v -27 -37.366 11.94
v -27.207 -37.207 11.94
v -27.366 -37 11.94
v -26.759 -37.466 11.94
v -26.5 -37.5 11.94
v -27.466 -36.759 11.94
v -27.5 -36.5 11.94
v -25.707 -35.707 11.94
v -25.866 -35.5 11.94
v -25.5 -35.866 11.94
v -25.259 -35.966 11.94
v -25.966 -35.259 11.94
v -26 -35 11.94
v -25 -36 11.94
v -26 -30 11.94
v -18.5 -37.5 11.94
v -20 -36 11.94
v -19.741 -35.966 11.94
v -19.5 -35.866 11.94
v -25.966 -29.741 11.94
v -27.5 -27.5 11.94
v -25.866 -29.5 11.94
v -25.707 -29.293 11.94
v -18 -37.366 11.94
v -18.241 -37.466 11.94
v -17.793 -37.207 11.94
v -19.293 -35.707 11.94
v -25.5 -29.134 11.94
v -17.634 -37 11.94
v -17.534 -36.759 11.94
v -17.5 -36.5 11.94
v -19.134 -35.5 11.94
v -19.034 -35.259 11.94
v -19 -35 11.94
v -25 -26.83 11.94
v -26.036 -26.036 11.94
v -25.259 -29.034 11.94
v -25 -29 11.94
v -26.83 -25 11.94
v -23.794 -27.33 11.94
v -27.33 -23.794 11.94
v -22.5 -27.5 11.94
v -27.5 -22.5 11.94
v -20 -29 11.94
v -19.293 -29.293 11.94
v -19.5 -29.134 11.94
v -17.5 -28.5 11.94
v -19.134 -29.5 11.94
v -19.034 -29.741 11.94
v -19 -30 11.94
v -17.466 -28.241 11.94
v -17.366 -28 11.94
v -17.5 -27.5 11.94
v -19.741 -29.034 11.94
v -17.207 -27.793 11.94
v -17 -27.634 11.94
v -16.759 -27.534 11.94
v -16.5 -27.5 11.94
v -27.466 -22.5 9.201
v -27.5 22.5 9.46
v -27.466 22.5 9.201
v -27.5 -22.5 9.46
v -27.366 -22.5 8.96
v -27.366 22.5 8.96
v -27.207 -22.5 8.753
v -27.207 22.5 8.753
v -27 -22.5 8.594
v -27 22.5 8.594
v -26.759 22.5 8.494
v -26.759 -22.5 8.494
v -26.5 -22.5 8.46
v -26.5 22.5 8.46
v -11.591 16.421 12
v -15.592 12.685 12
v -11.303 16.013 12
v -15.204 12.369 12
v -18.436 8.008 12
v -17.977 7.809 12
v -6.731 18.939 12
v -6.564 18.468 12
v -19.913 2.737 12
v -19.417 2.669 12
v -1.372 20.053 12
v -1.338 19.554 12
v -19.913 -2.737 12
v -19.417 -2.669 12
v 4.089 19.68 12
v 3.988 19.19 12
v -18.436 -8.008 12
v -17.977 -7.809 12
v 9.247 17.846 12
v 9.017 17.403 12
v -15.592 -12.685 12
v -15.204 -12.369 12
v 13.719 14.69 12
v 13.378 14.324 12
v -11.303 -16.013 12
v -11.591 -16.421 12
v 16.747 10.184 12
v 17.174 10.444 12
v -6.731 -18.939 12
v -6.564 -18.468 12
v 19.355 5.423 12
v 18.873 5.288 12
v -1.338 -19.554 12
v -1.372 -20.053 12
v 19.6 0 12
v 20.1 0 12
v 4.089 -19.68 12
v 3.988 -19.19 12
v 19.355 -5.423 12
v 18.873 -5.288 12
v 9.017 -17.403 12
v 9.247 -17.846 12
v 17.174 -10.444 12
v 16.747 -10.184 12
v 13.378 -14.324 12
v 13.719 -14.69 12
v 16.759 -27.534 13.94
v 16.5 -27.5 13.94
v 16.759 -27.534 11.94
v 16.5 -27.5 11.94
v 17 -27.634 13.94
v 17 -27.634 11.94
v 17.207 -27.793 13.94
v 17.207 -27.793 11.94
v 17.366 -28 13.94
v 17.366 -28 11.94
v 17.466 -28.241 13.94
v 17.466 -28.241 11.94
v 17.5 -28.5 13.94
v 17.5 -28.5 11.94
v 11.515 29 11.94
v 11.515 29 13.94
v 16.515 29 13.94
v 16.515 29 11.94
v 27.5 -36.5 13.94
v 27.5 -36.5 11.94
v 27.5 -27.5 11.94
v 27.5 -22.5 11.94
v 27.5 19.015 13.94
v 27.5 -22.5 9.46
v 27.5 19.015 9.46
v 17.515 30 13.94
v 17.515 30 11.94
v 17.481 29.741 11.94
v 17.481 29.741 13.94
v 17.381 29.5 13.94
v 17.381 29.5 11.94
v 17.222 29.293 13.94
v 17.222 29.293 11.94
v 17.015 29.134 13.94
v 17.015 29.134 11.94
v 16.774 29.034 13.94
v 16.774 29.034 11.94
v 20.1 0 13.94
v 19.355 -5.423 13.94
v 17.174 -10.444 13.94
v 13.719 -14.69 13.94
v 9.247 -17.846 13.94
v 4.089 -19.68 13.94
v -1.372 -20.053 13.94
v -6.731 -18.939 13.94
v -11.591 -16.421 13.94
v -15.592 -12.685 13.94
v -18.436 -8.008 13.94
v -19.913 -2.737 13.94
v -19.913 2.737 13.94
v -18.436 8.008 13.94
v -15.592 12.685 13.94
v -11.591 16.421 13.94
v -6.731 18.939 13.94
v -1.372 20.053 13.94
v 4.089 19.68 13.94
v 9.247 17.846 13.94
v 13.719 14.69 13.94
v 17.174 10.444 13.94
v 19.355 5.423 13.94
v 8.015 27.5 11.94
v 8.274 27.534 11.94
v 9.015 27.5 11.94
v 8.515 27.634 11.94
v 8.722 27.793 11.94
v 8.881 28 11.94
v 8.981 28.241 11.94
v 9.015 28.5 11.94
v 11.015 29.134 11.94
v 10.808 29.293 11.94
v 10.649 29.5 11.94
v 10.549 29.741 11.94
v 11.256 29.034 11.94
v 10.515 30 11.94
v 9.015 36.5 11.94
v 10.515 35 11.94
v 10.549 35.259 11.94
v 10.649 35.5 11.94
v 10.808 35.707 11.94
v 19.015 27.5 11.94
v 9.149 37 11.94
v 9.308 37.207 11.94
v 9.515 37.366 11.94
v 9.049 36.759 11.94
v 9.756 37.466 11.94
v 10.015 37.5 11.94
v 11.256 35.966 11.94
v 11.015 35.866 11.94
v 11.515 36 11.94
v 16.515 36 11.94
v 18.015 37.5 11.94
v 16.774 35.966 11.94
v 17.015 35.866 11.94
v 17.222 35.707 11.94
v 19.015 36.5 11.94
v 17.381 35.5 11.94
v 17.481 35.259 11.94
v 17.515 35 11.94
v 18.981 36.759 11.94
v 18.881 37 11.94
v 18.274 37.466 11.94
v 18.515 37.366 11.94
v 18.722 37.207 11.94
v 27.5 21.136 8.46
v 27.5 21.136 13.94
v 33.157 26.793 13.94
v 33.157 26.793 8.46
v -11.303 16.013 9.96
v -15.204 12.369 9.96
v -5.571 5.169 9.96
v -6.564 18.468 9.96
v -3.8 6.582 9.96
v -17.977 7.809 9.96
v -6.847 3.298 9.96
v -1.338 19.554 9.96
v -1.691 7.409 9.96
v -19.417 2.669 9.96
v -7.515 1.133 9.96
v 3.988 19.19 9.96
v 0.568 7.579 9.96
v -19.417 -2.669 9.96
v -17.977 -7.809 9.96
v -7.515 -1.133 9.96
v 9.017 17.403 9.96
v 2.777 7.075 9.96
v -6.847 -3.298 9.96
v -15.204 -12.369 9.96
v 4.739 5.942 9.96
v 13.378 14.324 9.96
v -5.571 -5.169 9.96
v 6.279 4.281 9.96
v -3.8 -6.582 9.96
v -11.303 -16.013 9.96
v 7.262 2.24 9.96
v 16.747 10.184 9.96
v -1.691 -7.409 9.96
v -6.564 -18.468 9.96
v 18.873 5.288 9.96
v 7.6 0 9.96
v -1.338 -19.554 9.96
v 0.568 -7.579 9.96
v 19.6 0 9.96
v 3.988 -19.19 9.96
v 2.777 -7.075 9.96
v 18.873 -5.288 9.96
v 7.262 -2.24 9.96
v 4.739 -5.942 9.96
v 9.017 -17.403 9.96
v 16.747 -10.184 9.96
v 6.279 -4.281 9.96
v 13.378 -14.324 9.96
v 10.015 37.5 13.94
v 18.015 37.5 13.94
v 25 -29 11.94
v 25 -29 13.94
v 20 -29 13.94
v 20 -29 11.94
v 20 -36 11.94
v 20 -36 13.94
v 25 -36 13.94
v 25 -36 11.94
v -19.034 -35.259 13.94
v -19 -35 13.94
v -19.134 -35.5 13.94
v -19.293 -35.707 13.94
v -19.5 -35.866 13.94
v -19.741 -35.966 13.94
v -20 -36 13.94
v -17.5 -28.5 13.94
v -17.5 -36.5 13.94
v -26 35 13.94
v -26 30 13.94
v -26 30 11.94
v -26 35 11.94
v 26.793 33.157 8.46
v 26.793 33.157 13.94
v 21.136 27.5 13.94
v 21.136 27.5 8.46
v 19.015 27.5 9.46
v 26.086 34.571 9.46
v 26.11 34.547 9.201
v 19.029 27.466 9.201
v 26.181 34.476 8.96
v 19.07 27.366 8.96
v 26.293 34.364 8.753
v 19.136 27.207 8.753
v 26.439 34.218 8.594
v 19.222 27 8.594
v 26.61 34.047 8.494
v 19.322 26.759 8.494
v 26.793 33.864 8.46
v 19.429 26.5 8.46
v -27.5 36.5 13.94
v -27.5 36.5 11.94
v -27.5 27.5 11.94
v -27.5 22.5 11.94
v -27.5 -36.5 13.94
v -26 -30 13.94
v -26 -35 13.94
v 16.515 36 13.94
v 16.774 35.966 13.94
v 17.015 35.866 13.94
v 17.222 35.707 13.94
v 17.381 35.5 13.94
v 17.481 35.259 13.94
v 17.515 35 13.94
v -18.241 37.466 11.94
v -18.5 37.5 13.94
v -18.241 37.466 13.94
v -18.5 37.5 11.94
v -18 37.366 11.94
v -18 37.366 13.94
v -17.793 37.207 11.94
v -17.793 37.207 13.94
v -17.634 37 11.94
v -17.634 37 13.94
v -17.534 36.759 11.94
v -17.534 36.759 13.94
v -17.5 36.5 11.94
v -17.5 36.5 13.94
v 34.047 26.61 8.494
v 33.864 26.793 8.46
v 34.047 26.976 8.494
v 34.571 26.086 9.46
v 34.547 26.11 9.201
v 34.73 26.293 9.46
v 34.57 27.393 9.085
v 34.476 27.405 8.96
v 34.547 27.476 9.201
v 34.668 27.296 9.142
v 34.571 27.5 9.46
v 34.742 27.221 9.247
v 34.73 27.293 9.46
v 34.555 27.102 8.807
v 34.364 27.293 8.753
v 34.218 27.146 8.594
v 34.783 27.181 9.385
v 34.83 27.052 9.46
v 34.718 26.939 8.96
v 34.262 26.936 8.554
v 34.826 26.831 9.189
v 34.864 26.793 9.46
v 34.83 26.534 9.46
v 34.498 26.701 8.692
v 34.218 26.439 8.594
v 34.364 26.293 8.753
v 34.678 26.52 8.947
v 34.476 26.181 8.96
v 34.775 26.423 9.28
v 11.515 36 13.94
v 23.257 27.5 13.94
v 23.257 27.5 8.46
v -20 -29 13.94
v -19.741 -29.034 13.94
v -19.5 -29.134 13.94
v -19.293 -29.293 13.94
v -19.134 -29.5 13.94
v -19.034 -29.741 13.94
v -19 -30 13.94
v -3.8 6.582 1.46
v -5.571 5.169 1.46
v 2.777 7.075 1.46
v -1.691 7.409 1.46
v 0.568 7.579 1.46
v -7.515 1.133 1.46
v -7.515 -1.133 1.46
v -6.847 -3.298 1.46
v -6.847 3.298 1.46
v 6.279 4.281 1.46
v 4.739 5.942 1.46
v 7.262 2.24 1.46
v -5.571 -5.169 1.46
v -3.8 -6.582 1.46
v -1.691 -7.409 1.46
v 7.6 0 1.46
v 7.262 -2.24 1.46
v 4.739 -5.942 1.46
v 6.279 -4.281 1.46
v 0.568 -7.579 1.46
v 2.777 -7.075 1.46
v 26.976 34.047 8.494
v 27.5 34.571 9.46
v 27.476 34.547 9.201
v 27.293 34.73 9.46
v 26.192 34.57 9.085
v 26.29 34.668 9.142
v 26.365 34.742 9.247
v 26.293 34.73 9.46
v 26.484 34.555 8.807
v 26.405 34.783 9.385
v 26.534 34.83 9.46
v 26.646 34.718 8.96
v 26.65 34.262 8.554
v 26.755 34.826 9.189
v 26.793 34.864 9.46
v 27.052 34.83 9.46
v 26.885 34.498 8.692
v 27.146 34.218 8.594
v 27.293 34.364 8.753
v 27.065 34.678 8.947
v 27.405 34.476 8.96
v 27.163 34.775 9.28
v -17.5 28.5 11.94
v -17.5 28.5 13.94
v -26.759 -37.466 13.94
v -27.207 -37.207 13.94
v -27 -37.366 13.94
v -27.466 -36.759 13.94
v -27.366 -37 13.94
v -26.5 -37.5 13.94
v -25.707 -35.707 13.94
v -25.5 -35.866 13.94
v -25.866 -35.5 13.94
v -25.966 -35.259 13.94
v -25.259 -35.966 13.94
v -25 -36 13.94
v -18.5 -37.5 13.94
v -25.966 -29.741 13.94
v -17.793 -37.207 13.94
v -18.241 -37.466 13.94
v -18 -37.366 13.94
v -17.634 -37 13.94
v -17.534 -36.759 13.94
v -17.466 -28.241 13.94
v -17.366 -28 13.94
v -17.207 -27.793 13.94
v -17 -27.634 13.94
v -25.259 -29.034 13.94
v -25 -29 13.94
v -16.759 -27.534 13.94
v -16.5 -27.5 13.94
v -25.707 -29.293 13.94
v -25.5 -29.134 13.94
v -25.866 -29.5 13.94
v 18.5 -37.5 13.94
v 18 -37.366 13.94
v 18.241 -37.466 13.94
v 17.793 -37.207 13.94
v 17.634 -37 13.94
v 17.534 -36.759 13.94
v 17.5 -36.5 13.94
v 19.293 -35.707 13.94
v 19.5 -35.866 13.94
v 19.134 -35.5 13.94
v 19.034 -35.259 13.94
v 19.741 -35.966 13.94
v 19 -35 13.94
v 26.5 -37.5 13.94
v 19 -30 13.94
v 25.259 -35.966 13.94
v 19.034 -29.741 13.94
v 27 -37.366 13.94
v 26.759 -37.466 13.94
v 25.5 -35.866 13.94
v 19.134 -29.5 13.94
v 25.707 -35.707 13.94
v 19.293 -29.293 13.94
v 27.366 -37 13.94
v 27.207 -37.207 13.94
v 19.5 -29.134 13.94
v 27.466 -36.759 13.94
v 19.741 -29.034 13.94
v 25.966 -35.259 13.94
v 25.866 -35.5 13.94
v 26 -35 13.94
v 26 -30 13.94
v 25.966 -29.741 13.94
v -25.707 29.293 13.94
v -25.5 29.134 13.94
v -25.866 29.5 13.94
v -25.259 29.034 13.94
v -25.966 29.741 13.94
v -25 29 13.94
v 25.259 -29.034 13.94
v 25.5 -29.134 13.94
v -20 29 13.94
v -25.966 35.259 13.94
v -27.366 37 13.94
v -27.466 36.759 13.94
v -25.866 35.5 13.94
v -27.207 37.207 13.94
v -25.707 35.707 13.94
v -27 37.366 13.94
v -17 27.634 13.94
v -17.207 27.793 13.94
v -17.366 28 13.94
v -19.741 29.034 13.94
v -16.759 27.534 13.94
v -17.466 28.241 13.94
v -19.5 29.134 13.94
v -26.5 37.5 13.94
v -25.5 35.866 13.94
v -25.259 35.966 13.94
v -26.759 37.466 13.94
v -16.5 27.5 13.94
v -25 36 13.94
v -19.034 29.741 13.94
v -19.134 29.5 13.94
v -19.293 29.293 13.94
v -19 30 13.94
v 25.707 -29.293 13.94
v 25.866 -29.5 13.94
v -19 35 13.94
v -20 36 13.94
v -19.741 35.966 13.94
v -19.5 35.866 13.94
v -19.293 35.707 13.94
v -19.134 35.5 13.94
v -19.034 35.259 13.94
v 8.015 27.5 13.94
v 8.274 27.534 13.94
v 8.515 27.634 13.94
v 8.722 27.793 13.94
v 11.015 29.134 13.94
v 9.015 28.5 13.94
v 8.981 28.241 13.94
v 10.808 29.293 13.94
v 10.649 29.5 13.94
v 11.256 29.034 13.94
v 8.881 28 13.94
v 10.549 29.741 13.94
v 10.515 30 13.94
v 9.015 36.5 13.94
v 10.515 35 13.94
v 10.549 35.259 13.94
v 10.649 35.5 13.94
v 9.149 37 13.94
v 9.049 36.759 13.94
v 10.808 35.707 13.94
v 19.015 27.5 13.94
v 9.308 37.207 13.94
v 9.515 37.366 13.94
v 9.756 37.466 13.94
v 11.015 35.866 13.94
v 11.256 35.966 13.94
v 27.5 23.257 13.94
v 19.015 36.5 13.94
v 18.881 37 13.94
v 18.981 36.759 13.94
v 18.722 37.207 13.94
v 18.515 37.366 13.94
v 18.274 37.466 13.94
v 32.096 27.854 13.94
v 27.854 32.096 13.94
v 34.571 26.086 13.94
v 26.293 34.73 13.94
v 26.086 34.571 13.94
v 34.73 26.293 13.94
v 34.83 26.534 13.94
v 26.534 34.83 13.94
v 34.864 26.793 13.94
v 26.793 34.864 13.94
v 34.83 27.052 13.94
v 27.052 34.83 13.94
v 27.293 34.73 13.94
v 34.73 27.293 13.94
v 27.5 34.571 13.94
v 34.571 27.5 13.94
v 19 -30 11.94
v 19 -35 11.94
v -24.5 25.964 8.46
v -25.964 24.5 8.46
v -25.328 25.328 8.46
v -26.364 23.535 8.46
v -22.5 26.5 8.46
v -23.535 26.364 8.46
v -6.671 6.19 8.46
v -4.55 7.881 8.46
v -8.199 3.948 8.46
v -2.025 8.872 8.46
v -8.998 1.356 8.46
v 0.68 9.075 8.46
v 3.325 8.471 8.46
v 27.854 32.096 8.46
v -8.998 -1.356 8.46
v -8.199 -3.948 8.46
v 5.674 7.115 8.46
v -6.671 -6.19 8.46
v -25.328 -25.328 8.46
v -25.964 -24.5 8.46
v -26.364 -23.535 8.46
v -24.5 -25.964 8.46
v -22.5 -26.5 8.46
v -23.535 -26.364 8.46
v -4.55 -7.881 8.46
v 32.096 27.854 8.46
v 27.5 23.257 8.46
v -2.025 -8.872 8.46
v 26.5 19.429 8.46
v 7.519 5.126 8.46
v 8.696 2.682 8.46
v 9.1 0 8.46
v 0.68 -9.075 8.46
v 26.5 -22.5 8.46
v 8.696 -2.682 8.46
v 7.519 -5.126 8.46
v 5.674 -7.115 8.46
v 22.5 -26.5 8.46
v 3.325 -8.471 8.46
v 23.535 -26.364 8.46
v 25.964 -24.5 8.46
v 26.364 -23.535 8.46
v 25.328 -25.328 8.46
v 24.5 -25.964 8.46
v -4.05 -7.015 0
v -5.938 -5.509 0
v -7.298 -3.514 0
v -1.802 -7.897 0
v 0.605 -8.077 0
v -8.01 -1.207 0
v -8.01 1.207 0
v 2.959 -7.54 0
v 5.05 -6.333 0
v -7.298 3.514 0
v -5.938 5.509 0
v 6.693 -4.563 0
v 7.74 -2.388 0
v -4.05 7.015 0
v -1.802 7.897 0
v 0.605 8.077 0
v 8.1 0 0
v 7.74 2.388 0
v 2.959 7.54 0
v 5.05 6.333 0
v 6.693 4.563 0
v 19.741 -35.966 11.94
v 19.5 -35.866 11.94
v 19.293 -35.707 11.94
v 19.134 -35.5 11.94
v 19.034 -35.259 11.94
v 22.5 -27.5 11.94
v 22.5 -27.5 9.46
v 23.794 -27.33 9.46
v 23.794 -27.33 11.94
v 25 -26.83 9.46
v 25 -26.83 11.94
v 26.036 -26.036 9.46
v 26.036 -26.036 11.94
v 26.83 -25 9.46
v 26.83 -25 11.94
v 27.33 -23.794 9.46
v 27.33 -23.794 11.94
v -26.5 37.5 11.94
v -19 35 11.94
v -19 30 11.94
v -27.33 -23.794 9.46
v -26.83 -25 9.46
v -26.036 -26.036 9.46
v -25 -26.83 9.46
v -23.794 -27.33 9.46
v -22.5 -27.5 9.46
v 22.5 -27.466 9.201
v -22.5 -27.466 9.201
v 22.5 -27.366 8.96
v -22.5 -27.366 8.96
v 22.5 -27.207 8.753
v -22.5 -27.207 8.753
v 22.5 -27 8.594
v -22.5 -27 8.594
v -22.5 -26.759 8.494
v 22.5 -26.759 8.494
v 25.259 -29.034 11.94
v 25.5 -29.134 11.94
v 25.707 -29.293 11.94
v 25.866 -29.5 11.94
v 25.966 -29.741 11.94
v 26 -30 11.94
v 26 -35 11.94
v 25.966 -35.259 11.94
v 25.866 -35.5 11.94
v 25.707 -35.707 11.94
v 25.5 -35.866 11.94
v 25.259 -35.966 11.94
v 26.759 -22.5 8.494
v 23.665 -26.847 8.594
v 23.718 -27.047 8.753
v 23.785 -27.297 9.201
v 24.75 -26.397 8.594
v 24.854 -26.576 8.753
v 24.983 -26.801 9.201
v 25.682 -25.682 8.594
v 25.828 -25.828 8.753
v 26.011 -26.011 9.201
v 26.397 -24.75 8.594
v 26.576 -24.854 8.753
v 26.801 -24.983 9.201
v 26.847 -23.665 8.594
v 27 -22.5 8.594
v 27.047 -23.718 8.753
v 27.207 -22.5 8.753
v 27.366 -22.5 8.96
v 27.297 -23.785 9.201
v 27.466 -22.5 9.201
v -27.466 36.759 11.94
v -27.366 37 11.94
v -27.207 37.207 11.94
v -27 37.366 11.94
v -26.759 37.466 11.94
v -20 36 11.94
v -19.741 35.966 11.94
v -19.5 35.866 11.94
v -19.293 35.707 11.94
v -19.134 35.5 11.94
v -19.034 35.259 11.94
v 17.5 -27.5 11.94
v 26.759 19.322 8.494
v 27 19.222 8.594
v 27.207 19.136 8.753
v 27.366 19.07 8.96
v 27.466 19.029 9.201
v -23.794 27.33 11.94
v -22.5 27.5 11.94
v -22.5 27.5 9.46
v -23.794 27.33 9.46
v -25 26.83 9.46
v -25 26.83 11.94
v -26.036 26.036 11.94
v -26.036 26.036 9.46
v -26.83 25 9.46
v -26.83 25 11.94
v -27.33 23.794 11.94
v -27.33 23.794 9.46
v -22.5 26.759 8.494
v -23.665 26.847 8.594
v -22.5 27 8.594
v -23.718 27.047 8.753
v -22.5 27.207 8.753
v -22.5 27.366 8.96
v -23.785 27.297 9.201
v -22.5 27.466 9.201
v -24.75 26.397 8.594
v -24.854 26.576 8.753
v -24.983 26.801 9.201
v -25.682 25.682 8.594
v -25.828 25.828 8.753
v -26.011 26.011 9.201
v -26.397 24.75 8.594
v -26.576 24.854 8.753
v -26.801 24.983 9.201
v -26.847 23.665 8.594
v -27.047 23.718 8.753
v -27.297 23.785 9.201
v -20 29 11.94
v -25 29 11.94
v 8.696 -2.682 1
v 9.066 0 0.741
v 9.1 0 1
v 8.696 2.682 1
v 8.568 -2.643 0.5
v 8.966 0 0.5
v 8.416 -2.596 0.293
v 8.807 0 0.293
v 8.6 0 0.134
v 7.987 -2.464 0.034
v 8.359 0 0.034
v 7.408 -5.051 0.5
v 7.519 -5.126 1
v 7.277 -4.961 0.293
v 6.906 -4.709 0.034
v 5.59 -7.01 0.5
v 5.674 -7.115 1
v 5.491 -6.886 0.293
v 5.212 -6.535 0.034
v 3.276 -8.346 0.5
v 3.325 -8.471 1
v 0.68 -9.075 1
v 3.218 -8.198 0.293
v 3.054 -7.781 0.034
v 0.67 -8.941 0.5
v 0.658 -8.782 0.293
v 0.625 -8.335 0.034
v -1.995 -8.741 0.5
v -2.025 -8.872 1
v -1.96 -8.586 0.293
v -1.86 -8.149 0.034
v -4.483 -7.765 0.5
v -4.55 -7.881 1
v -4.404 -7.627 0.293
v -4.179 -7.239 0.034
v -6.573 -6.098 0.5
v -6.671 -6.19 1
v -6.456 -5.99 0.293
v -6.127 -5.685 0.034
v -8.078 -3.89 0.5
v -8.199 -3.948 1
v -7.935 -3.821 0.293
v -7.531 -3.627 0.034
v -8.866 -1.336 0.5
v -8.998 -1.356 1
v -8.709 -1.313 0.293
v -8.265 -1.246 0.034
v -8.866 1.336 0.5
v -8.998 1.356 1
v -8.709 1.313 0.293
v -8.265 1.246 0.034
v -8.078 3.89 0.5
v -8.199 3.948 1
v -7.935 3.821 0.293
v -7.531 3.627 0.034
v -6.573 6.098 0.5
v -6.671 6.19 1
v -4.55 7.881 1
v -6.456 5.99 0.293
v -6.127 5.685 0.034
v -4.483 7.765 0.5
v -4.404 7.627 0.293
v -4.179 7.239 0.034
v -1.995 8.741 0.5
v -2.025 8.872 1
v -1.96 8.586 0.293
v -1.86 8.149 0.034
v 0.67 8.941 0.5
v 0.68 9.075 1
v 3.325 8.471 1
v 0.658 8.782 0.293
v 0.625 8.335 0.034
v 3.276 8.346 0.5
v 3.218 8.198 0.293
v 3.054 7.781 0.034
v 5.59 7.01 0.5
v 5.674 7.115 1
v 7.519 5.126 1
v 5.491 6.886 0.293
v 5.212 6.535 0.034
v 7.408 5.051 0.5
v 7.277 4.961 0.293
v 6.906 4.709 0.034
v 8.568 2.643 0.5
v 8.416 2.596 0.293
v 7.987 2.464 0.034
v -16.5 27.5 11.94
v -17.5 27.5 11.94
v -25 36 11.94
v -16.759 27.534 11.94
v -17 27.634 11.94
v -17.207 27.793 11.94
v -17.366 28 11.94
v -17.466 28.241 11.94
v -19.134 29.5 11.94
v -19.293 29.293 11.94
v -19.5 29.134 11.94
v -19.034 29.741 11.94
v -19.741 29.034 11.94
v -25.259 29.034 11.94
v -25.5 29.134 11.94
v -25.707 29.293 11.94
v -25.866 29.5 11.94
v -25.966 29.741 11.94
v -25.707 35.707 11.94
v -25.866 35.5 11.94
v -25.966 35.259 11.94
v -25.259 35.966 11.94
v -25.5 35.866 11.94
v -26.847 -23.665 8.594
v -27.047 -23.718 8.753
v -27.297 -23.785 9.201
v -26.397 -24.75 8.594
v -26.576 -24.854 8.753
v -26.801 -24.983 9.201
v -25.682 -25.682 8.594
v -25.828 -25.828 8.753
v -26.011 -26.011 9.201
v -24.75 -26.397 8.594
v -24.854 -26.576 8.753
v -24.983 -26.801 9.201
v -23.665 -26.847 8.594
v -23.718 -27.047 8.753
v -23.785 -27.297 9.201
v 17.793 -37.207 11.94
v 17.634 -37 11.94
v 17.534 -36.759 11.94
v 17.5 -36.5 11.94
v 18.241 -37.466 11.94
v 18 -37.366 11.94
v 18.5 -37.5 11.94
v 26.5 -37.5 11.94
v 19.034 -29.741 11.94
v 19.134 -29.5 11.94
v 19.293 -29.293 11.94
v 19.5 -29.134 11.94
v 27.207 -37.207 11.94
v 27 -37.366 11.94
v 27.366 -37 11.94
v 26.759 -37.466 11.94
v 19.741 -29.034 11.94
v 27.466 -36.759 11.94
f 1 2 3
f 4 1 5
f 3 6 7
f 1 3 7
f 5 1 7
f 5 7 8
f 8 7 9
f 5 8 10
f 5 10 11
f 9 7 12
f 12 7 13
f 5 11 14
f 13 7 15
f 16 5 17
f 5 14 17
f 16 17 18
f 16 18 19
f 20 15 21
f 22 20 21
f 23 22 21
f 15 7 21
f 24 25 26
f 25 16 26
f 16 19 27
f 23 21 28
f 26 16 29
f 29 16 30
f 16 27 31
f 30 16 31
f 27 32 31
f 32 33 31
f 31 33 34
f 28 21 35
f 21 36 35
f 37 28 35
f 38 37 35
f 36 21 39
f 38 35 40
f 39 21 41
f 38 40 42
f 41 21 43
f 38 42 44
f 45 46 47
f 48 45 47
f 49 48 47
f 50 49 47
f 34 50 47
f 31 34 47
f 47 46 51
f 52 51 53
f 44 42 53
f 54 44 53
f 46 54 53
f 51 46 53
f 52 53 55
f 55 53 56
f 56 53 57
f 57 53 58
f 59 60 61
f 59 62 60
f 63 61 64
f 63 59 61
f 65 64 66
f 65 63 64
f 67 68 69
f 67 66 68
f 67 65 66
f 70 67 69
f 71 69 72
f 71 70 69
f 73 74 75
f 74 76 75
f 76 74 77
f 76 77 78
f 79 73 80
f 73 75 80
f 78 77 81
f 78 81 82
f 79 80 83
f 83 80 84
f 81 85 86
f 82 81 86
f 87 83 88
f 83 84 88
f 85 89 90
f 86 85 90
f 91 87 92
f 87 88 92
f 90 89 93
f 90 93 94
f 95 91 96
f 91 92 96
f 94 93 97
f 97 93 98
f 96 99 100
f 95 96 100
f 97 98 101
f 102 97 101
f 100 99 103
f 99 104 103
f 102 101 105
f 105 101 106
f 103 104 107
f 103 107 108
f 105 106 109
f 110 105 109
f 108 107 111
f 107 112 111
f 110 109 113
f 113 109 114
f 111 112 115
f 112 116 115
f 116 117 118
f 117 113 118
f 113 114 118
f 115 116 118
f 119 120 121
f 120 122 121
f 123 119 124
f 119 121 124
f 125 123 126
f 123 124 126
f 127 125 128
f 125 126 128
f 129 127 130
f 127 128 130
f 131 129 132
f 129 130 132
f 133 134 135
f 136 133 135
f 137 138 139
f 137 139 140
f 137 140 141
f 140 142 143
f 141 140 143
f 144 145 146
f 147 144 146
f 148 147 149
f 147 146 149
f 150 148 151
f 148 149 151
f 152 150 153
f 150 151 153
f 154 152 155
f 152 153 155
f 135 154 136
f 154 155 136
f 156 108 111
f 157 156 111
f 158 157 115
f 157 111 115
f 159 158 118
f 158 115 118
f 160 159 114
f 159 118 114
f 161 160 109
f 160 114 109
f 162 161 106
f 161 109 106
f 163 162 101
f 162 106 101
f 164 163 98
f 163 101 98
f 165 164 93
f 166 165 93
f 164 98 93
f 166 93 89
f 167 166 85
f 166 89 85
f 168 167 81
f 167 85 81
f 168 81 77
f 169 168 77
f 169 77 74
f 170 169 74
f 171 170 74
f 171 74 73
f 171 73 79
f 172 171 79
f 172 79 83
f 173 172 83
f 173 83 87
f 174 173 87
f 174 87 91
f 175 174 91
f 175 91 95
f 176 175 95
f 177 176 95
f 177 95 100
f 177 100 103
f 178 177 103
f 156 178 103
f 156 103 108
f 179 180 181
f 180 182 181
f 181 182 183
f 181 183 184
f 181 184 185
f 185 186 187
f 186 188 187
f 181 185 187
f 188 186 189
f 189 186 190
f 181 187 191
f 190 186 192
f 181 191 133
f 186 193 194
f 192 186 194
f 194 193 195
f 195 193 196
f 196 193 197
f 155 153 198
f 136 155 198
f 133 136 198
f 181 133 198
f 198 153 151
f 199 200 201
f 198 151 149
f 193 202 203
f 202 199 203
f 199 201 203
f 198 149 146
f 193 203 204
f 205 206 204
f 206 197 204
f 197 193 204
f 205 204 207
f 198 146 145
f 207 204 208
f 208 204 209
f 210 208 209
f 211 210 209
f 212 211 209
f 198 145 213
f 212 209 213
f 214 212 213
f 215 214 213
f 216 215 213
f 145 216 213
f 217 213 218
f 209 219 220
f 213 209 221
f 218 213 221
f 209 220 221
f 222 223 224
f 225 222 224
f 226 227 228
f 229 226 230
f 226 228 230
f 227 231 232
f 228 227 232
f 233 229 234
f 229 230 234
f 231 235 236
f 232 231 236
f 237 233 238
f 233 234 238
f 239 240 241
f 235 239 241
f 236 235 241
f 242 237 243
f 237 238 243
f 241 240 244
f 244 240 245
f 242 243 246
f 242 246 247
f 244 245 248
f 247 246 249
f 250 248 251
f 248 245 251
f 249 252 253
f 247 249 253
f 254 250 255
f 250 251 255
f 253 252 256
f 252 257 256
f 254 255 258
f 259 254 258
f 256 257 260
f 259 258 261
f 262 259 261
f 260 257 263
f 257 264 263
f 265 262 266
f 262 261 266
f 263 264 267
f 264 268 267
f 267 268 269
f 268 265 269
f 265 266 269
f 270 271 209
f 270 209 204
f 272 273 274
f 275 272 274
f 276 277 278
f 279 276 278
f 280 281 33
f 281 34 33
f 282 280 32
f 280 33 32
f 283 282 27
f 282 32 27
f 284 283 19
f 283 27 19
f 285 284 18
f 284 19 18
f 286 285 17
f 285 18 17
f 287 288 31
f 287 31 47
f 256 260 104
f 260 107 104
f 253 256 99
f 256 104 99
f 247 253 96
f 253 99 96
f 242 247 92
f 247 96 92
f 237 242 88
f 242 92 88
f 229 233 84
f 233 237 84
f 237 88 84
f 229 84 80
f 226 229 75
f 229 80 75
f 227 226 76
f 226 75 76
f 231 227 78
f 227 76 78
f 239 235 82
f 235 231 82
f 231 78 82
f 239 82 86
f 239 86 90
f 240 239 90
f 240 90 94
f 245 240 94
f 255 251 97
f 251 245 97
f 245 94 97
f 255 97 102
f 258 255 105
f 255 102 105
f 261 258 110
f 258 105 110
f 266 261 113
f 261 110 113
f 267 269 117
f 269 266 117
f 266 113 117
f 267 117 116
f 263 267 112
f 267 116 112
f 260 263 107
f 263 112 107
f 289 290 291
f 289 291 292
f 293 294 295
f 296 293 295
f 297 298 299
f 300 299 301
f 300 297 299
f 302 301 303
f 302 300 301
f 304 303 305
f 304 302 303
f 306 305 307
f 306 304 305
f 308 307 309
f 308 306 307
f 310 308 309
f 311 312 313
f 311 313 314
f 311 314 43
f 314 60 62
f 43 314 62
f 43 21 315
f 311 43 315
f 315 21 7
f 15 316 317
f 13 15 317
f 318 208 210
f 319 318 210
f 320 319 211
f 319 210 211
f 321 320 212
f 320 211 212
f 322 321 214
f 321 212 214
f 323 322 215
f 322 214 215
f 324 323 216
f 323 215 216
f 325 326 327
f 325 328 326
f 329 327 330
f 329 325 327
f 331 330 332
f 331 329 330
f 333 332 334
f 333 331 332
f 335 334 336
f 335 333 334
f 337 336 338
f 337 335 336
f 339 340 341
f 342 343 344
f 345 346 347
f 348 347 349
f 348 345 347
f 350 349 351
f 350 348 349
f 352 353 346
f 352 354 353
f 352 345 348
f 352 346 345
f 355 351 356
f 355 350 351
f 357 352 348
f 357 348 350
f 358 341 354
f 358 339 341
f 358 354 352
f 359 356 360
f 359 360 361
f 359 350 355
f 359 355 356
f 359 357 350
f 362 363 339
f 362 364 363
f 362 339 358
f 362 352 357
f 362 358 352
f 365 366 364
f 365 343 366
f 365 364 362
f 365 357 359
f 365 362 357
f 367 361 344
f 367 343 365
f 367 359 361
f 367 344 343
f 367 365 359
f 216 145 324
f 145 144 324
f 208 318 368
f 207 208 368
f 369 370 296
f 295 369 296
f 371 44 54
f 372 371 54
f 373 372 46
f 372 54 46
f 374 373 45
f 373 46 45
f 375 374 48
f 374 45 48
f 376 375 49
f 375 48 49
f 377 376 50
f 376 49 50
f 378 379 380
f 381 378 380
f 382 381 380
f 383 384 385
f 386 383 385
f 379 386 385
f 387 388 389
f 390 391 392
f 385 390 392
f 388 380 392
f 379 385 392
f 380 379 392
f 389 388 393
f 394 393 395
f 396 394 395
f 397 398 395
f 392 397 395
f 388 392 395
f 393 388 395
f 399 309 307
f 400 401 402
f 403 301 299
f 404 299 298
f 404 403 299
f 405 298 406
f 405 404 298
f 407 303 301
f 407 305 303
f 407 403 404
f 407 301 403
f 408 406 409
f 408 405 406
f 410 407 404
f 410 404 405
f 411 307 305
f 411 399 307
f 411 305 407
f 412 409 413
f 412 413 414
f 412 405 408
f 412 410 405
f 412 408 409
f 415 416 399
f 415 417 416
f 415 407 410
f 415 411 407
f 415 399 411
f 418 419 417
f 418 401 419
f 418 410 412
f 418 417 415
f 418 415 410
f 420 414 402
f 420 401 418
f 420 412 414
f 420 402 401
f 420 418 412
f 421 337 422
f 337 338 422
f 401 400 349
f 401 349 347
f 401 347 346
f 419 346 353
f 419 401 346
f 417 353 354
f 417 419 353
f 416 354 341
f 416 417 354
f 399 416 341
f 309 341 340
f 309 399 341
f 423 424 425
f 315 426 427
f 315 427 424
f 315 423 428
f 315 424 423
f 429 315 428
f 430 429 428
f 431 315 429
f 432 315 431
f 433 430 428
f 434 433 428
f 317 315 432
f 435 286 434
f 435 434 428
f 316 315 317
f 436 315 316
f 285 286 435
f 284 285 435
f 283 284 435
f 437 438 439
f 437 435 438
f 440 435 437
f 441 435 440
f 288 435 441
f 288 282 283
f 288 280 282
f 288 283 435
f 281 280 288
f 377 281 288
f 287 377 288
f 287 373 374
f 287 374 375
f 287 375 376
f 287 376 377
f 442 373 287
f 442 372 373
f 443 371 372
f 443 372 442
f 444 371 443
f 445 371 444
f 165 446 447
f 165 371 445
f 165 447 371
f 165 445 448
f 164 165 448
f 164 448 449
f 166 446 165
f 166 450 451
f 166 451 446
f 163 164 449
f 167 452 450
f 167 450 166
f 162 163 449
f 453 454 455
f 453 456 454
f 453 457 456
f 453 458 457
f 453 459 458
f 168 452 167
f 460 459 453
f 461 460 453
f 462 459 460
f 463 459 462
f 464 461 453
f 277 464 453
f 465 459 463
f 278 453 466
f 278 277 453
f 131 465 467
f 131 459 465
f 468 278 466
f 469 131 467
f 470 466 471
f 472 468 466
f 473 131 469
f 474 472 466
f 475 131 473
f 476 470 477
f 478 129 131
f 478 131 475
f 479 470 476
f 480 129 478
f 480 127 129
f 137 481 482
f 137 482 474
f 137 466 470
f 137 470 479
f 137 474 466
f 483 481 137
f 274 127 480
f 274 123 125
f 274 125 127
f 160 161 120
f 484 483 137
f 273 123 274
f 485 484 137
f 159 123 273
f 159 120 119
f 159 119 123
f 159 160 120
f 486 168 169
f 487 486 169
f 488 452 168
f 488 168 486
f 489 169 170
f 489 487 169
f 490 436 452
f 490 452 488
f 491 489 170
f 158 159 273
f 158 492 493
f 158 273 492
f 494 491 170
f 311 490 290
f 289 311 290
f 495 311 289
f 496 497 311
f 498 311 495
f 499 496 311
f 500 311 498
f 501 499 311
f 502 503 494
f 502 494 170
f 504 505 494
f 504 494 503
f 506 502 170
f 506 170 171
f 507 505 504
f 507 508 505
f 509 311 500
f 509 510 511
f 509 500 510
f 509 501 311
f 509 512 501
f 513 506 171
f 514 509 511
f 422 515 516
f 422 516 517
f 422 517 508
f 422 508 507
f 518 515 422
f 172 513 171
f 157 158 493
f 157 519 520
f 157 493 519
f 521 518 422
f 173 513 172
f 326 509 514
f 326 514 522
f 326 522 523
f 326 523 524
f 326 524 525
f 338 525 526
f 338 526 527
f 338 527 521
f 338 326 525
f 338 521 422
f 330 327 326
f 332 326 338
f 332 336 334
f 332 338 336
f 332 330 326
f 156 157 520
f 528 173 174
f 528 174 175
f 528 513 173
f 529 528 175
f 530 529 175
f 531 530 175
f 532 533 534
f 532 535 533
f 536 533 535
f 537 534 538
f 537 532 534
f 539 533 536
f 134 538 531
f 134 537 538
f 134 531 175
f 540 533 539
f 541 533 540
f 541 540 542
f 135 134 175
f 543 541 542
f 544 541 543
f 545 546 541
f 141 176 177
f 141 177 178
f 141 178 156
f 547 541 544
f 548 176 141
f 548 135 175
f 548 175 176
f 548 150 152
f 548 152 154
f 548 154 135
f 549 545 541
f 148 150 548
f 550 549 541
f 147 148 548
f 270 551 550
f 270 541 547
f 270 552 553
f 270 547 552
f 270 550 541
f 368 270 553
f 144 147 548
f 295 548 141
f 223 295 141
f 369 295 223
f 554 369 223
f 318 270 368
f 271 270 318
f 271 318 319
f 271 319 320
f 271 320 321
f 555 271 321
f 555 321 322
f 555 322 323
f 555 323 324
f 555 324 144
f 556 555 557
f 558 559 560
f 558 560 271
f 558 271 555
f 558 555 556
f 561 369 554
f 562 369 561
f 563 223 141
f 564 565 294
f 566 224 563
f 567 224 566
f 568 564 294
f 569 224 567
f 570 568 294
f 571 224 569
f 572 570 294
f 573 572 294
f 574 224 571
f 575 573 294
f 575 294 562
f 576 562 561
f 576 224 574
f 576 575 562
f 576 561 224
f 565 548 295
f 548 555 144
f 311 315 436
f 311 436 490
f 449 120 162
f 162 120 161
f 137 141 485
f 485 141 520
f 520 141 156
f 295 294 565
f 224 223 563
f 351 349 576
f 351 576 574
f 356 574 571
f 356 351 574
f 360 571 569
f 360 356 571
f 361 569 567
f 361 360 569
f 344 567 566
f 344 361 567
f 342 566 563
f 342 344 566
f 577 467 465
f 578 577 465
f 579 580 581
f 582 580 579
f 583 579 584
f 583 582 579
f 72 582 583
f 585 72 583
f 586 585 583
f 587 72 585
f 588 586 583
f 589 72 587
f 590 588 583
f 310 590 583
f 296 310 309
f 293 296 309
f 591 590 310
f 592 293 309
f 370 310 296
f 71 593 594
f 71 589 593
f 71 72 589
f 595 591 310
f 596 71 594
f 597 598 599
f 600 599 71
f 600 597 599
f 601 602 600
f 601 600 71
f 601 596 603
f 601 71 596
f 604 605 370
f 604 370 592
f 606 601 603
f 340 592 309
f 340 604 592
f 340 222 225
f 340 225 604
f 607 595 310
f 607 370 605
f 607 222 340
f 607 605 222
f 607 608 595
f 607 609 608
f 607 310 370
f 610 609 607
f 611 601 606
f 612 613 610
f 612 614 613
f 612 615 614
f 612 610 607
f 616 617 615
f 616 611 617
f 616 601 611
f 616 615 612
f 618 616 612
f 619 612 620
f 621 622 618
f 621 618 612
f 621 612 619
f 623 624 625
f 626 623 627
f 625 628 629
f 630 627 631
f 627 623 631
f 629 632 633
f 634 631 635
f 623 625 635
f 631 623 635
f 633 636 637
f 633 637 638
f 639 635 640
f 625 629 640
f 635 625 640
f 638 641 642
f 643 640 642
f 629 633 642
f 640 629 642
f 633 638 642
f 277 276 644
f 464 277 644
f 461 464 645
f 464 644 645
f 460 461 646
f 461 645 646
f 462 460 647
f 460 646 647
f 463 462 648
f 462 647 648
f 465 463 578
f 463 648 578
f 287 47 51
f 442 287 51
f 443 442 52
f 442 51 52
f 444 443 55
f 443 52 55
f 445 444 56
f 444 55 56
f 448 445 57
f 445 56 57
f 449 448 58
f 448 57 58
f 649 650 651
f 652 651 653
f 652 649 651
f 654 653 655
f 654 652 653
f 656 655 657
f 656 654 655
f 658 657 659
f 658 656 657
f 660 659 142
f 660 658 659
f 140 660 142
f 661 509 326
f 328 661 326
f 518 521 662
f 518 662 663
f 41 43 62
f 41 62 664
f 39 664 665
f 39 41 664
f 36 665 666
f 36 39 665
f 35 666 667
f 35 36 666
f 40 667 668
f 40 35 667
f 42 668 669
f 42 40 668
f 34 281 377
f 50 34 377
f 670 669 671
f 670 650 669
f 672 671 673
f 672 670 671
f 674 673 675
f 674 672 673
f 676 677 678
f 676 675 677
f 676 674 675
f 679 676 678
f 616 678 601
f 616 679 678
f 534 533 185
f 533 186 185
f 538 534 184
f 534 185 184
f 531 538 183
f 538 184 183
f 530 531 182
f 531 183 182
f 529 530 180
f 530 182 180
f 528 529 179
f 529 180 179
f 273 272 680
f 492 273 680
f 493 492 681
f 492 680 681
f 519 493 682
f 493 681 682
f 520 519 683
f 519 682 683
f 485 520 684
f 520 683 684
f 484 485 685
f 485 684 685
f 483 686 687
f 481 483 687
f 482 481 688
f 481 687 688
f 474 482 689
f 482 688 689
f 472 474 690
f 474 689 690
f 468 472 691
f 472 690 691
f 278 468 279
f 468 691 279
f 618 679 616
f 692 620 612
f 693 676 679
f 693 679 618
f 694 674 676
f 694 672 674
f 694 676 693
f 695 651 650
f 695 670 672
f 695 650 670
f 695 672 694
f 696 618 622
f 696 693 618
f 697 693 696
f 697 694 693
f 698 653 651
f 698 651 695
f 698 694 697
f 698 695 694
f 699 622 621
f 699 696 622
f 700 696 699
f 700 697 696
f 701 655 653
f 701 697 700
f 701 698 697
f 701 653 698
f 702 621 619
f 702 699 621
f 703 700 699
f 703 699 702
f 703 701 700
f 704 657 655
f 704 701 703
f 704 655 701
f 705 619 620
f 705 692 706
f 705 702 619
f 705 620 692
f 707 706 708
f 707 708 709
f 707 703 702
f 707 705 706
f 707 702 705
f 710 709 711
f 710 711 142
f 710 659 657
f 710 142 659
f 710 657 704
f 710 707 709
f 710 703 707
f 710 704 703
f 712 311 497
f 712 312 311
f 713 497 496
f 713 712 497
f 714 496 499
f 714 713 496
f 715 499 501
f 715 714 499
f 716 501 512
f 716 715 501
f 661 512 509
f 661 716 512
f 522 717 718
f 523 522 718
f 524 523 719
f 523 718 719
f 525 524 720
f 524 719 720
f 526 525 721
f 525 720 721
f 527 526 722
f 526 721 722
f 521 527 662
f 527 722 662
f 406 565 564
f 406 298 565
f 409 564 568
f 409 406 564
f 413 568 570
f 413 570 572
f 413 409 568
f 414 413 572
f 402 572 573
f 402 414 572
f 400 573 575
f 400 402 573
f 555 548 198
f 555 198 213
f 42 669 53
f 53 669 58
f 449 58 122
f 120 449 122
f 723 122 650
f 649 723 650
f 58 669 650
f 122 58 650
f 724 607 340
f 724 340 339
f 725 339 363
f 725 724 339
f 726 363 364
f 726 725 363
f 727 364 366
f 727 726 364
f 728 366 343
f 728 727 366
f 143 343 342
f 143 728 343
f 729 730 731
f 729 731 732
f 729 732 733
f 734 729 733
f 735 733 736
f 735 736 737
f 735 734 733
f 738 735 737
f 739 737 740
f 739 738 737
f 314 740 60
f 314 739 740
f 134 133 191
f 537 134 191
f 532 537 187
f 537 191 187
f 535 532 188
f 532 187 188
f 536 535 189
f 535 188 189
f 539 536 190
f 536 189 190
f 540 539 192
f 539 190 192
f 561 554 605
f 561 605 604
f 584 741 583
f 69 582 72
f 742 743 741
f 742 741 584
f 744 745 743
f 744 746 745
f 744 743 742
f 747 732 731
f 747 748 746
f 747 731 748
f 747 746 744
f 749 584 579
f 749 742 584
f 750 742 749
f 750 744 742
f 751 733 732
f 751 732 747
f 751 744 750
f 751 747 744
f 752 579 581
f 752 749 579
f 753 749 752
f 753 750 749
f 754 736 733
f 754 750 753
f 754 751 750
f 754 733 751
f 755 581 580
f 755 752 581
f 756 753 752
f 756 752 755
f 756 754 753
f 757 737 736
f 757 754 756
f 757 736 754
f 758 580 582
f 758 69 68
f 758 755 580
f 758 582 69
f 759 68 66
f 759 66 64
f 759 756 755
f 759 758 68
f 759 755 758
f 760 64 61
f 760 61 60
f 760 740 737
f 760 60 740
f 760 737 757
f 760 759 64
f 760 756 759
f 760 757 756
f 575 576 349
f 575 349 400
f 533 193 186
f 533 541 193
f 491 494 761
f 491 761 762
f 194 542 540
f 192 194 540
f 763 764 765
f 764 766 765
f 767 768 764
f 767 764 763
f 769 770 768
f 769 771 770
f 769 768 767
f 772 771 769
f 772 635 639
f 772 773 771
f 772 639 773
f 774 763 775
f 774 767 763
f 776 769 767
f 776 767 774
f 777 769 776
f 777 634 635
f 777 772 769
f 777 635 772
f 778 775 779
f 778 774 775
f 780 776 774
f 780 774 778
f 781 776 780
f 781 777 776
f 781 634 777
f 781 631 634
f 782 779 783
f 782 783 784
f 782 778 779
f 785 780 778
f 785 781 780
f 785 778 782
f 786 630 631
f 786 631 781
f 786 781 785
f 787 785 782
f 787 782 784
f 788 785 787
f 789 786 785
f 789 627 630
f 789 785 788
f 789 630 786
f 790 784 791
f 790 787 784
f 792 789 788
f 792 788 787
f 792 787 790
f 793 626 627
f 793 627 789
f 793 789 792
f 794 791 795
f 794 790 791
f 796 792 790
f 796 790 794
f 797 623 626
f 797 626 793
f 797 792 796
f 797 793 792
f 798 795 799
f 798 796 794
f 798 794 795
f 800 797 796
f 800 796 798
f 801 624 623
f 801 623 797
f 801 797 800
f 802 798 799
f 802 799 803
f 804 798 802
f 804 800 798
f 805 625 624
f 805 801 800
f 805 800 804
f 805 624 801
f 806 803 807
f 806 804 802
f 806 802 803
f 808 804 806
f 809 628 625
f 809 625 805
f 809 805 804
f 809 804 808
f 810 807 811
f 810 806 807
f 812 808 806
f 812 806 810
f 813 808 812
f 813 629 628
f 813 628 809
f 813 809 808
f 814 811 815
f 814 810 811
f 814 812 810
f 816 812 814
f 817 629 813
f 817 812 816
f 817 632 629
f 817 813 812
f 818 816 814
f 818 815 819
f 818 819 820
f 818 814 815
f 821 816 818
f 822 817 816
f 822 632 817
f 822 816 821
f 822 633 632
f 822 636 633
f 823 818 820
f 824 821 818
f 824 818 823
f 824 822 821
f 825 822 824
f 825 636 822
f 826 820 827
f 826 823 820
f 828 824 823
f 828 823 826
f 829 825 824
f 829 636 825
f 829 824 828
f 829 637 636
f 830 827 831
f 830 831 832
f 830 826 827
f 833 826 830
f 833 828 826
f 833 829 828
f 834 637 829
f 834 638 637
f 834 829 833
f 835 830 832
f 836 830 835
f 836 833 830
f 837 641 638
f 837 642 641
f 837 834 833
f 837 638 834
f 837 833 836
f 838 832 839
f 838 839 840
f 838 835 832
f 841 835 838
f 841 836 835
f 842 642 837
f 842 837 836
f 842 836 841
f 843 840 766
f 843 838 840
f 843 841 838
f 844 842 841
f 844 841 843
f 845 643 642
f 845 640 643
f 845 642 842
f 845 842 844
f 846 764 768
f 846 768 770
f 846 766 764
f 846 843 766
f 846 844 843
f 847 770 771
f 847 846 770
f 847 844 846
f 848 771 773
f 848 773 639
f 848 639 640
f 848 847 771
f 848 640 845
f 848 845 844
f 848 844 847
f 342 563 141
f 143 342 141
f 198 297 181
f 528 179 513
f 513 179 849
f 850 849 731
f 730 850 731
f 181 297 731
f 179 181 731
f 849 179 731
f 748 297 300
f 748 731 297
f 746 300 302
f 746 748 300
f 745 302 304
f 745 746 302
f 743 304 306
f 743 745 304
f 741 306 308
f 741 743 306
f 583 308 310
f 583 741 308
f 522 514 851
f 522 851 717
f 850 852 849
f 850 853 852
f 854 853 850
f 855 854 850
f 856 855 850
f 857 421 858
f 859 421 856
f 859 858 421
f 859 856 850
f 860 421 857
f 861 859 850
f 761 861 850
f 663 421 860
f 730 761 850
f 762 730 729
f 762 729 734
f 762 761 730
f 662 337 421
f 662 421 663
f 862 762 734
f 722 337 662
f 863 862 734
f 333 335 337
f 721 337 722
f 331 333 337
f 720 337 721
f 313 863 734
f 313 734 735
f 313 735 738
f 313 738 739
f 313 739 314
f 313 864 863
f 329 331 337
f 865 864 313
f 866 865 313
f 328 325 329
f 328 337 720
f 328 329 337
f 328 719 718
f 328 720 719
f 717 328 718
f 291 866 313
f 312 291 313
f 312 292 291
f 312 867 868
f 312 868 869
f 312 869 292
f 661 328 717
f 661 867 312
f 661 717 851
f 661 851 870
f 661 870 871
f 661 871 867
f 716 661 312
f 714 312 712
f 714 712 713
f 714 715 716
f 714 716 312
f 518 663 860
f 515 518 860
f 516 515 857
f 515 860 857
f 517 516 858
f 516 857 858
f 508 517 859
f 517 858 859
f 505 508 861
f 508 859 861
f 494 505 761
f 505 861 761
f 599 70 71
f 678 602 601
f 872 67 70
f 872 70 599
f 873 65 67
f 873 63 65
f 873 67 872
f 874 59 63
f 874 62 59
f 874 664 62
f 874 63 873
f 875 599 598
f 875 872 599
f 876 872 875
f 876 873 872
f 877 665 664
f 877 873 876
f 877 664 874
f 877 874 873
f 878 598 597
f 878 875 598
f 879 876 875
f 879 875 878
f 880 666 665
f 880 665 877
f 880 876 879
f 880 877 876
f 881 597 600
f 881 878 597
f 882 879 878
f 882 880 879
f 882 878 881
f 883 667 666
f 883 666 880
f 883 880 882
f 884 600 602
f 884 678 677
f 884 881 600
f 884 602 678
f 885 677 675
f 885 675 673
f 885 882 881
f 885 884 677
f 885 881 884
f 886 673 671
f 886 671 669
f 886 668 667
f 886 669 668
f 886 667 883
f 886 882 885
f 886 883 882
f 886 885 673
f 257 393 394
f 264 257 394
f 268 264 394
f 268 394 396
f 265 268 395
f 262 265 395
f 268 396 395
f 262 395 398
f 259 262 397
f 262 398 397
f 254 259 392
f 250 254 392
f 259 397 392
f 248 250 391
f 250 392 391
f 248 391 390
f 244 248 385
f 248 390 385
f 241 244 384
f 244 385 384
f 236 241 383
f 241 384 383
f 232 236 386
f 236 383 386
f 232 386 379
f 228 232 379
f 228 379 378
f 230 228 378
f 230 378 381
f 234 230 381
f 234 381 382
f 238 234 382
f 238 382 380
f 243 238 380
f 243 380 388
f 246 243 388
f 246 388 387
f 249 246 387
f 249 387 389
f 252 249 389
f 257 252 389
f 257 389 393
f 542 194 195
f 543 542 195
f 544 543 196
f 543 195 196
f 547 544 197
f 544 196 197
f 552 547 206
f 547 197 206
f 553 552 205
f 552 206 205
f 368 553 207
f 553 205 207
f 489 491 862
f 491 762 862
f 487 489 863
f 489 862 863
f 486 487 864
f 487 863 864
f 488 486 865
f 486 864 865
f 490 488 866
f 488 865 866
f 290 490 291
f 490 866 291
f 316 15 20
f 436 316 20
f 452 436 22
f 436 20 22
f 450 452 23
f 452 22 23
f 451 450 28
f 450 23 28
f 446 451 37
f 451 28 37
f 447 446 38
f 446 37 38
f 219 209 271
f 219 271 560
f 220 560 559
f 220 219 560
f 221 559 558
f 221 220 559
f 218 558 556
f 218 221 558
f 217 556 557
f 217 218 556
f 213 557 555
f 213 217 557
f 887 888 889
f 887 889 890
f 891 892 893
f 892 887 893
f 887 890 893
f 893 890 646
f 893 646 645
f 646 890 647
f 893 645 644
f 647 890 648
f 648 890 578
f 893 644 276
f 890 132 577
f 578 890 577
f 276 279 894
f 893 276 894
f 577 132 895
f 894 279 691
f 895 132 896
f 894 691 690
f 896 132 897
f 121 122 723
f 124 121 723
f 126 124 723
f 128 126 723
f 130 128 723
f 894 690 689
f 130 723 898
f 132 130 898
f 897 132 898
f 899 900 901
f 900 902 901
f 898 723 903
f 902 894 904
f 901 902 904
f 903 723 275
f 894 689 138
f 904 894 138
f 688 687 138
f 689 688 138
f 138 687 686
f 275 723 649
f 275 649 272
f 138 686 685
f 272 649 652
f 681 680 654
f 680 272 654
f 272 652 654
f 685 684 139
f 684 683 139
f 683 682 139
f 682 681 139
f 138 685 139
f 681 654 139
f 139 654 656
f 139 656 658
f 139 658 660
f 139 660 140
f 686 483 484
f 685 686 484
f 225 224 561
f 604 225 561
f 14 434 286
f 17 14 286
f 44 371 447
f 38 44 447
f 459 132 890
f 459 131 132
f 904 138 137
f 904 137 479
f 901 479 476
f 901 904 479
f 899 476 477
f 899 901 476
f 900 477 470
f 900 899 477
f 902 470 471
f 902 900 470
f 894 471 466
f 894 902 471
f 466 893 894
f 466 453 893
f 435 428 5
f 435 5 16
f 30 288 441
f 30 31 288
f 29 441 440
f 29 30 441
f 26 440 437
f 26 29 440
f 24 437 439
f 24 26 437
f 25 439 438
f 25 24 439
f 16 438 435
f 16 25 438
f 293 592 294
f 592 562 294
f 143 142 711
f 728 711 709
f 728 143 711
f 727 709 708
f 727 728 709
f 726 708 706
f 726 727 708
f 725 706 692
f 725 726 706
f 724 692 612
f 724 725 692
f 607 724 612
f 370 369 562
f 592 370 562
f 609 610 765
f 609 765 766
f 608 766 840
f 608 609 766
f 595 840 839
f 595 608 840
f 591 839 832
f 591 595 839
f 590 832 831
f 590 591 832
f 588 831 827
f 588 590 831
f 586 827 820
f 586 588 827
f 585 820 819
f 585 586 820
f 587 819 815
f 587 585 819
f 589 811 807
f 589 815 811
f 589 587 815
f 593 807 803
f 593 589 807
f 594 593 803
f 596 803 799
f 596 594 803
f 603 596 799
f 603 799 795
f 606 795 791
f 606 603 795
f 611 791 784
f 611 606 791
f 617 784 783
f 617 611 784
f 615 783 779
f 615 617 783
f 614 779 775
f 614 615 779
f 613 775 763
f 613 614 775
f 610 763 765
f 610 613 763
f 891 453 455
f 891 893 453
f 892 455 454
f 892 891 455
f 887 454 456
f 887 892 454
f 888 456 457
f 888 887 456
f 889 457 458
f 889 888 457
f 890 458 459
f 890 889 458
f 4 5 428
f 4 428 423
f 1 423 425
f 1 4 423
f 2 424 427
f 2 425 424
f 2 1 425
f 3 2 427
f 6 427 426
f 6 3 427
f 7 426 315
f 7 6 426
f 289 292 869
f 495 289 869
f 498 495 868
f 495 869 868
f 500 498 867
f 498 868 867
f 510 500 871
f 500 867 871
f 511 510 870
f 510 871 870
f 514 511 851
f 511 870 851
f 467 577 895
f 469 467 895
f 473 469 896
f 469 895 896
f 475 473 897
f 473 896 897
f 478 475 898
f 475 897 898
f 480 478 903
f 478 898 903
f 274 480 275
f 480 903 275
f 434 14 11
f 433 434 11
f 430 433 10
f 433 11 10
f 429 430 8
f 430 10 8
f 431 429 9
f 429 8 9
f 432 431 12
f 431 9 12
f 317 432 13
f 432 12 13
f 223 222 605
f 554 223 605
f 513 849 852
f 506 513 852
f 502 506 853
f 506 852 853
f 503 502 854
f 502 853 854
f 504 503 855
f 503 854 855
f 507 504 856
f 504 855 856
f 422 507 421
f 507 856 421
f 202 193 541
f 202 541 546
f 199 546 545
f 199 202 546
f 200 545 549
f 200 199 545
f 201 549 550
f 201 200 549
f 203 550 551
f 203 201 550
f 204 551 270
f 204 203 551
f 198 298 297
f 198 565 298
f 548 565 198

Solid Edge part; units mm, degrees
sketch "Sketch1" plane through (0, 0, 0) normal (0, 0, 1) x (1, 0, 0)
  line L0 (27.5, 27.5) -> (-27.5, 27.5)
  line L1 (-27.5, 27.5) -> (-27.5, -27.5)
  line L2 (-27.5, -27.5) -> (27.5, -27.5)
  line L3 (27.5, -27.5) -> (27.5, 27.5)
extrude "Protrusion1" add sketch "Sketch1" along normal blind 13.94
sketch "Sketch2" plane through (0, 0, 0) normal (0, -1, 0) x (1, 0, 0)
  line L0 (20.1, 13.94) -> (20.1, 12)
  line L1 (19.6, 12) -> (20.1, 12)
  line L2 (19.6, 9.96) -> (19.6, 12)
  line L3 (7.6, 9.96) -> (19.6, 9.96)
  line L4 (7.6, 9.96) -> (7.6, 1.46)
  line L5 (7.6, 1.46) -> (0, 1.46)
  line L6 (0, 13.94) -> (0, 1.46)
  line L7 (20.1, 13.94) -> (0, 13.94)
revolve "RevolvedCutout1" cut sketch "Sketch2" angle 360 about axis through (0, 0, 13.94) along (0, 0, -1)
sketch "Sketch3" plane through (0, 0, 6.97) normal (0, -1, 0) x (1, 0, 0)
  line L0 (9.1, 1.49) -> (39.1, 1.49)
  line L1 (39.1, 1.49) -> (39.1, -6.97)
  line L2 (39.1, -6.97) -> (9.1, -6.97)
  line L3 (9.1, -6.97) -> (9.1, 1.49)
revolve "RevolvedCutout2" cut sketch "Sketch3" angle 360 about axis through (0, 0, 12.8514) along (0, 0, -1)
sketch "Sketch4" plane through (0, 0, 13.94) normal (0, 0, 1) x (-1, 0, 0)
  line L0 (-35.2782, -26.7929) -> (-26.7929, -35.2782)
  line L1 (-26.7929, -35.2782) -> (-19.0147, -27.5)
  line L2 (-19.0147, -27.5) -> (-21.136, -27.5)
  line L3 (-26.7929, -33.1569) -> (-21.136, -27.5)
  line L4 (-27.8536, -32.0962) -> (-26.7929, -33.1569)
  line L5 (-23.2574, -27.5) -> (-27.8536, -32.0962)
  line L6 (-27.5, -27.5) -> (-23.2574, -27.5)
  line L7 (-27.5, -23.2574) -> (-27.5, -27.5)
  line L8 (-27.5, -23.2574) -> (-32.0962, -27.8536)
  line L9 (-33.1569, -26.7929) -> (-32.0962, -27.8536)
  line L10 (-27.5, -21.136) -> (-33.1569, -26.7929)
  line L11 (-27.5, -19.0147) -> (-27.5, -21.136)
  line L12 (-35.2782, -26.7929) -> (-27.5, -19.0147)
extrude "Protrusion2" add sketch "Sketch4" against normal up to vertex (5.48 mm away)
sketch "Sketch5" plane through (3.8891, 3.8891, 13.94) normal (0, 0, 1) x (0, 1, 0)
  line L0 (32.1109, 22.8891) -> (25.1109, 22.8891)
  line L1 (25.1109, 22.8891) -> (25.1109, 29.8891)
  line L2 (25.1109, 29.8891) -> (32.1109, 29.8891)
  line L3 (32.1109, 29.8891) -> (32.1109, 22.8891)
  line L4 (33.6109, 21.3891) -> (23.6109, 21.3891)
  line L5 (23.6109, 21.3891) -> (23.6109, 31.3891)
  line L6 (23.6109, 31.3891) -> (33.6109, 31.3891)
  line L7 (33.6109, 31.3891) -> (33.6109, 21.3891)
  line L8 (32.1109, -6.6256) -> (25.1109, -6.6256)
  line L9 (25.1109, -6.6256) -> (25.1109, -13.6256)
  line L10 (25.1109, -13.6256) -> (32.1109, -13.6256)
  line L11 (32.1109, -13.6256) -> (32.1109, -6.6256)
  line L12 (33.6109, -5.1256) -> (23.6109, -5.1256)
  line L13 (23.6109, -5.1256) -> (23.6109, -15.1256)
  line L14 (23.6109, -15.1256) -> (33.6109, -15.1256)
  line L15 (33.6109, -15.1256) -> (33.6109, -5.1256)
  line L16 (-32.8891, -15.1109) -> (-39.8891, -15.1109)
  line L17 (-39.8891, -15.1109) -> (-39.8891, -22.1109)
  line L18 (-39.8891, -22.1109) -> (-32.8891, -22.1109)
  line L19 (-32.8891, -22.1109) -> (-32.8891, -15.1109)
  line L20 (-31.3891, -13.6109) -> (-41.3891, -13.6109)
  line L21 (-41.3891, -13.6109) -> (-41.3891, -23.6109)
  line L22 (-41.3891, -23.6109) -> (-31.3891, -23.6109)
  line L23 (-31.3891, -23.6109) -> (-31.3891, -13.6109)
  line L24 (-39.8891, 22.8891) -> (-32.8891, 22.8891)
  line L25 (-32.8891, 22.8891) -> (-32.8891, 29.8891)
  line L26 (-32.8891, 29.8891) -> (-39.8891, 29.8891)
  line L27 (-39.8891, 29.8891) -> (-39.8891, 22.8891)
  line L28 (-41.3891, 21.3891) -> (-31.3891, 21.3891)
  line L29 (-31.3891, 21.3891) -> (-31.3891, 31.3891)
  line L30 (-31.3891, 31.3891) -> (-41.3891, 31.3891)
  line L31 (-41.3891, 31.3891) -> (-41.3891, 21.3891)
  dimension "D1" = 1.5
  dimension "D2" = 10
  dimension "D3" = 10
  dimension "D4" = 10
  dimension "D5" = 10
  dimension "D6" = 1.5
  dimension "D7" = 1.5
  dimension "D8" = 1.5
  dimension "D9" = 10
  dimension "D10" = 10
  dimension "D11" = 10
  dimension "D12" = 10
extrude "Protrusion3" add sketch "Sketch5" against normal blind 2
fillet "Round_1" radius 5 3 edges at (-27.5, 27.5, 10.2) (-27.5, -27.5, 10.2) (27.5, -27.5, 10.2)
fillet "Round_2" radius 1 28 edges at (-27.5, 37.5, 12.94) (-17.5, 37.5, 12.94) (-26, 36, 12.94) (-19, 36, 12.94) (-26, 29, 12.94) (-19, 29, 12.94) (-17.5, 27.5, 12.94) (10.5147, 29, 12.94) (17.5147, 29, 12.94) (10.5147, 36, 12.94) (17.5147, 36, 12.94) (9.0147, 37.5, 12.94) (19.0147, 37.5, 12.94) (9.0147, 27.5, 12.94) (-26, -29, 12.94) (-26, -36, 12.94) (-19, -36, 12.94) (-19, -29, 12.94) (-17.5, -27.5, 12.94) (-17.5, -37.5, 12.94) (-27.5, -37.5, 12.94) (19, -29, 12.94) (19, -36, 12.94) (26, -36, 12.94) (26, -29, 12.94) (27.5, -37.5, 12.94) (17.5, -37.5, 12.94) (17.5, -27.5, 12.94)
fillet "Round_3" radius 1 13 edges at (-9.1, 0, 0) (0, -27.5, 8.46) (26.0355, -26.0355, 8.46) (27.5, -1.7426, 8.46) (-26.0355, -26.0355, 8.46) (-27.5, 0, 8.46) (-26.0355, 26.0355, 8.46) (-1.7426, 27.5, 8.46) (31.3891, 22.9038, 8.46) (31.0355, 31.0355, 8.46) (22.9038, 31.3891, 8.46) (35.2782, 26.7929, 11.2) (26.7929, 35.2782, 11.2)
